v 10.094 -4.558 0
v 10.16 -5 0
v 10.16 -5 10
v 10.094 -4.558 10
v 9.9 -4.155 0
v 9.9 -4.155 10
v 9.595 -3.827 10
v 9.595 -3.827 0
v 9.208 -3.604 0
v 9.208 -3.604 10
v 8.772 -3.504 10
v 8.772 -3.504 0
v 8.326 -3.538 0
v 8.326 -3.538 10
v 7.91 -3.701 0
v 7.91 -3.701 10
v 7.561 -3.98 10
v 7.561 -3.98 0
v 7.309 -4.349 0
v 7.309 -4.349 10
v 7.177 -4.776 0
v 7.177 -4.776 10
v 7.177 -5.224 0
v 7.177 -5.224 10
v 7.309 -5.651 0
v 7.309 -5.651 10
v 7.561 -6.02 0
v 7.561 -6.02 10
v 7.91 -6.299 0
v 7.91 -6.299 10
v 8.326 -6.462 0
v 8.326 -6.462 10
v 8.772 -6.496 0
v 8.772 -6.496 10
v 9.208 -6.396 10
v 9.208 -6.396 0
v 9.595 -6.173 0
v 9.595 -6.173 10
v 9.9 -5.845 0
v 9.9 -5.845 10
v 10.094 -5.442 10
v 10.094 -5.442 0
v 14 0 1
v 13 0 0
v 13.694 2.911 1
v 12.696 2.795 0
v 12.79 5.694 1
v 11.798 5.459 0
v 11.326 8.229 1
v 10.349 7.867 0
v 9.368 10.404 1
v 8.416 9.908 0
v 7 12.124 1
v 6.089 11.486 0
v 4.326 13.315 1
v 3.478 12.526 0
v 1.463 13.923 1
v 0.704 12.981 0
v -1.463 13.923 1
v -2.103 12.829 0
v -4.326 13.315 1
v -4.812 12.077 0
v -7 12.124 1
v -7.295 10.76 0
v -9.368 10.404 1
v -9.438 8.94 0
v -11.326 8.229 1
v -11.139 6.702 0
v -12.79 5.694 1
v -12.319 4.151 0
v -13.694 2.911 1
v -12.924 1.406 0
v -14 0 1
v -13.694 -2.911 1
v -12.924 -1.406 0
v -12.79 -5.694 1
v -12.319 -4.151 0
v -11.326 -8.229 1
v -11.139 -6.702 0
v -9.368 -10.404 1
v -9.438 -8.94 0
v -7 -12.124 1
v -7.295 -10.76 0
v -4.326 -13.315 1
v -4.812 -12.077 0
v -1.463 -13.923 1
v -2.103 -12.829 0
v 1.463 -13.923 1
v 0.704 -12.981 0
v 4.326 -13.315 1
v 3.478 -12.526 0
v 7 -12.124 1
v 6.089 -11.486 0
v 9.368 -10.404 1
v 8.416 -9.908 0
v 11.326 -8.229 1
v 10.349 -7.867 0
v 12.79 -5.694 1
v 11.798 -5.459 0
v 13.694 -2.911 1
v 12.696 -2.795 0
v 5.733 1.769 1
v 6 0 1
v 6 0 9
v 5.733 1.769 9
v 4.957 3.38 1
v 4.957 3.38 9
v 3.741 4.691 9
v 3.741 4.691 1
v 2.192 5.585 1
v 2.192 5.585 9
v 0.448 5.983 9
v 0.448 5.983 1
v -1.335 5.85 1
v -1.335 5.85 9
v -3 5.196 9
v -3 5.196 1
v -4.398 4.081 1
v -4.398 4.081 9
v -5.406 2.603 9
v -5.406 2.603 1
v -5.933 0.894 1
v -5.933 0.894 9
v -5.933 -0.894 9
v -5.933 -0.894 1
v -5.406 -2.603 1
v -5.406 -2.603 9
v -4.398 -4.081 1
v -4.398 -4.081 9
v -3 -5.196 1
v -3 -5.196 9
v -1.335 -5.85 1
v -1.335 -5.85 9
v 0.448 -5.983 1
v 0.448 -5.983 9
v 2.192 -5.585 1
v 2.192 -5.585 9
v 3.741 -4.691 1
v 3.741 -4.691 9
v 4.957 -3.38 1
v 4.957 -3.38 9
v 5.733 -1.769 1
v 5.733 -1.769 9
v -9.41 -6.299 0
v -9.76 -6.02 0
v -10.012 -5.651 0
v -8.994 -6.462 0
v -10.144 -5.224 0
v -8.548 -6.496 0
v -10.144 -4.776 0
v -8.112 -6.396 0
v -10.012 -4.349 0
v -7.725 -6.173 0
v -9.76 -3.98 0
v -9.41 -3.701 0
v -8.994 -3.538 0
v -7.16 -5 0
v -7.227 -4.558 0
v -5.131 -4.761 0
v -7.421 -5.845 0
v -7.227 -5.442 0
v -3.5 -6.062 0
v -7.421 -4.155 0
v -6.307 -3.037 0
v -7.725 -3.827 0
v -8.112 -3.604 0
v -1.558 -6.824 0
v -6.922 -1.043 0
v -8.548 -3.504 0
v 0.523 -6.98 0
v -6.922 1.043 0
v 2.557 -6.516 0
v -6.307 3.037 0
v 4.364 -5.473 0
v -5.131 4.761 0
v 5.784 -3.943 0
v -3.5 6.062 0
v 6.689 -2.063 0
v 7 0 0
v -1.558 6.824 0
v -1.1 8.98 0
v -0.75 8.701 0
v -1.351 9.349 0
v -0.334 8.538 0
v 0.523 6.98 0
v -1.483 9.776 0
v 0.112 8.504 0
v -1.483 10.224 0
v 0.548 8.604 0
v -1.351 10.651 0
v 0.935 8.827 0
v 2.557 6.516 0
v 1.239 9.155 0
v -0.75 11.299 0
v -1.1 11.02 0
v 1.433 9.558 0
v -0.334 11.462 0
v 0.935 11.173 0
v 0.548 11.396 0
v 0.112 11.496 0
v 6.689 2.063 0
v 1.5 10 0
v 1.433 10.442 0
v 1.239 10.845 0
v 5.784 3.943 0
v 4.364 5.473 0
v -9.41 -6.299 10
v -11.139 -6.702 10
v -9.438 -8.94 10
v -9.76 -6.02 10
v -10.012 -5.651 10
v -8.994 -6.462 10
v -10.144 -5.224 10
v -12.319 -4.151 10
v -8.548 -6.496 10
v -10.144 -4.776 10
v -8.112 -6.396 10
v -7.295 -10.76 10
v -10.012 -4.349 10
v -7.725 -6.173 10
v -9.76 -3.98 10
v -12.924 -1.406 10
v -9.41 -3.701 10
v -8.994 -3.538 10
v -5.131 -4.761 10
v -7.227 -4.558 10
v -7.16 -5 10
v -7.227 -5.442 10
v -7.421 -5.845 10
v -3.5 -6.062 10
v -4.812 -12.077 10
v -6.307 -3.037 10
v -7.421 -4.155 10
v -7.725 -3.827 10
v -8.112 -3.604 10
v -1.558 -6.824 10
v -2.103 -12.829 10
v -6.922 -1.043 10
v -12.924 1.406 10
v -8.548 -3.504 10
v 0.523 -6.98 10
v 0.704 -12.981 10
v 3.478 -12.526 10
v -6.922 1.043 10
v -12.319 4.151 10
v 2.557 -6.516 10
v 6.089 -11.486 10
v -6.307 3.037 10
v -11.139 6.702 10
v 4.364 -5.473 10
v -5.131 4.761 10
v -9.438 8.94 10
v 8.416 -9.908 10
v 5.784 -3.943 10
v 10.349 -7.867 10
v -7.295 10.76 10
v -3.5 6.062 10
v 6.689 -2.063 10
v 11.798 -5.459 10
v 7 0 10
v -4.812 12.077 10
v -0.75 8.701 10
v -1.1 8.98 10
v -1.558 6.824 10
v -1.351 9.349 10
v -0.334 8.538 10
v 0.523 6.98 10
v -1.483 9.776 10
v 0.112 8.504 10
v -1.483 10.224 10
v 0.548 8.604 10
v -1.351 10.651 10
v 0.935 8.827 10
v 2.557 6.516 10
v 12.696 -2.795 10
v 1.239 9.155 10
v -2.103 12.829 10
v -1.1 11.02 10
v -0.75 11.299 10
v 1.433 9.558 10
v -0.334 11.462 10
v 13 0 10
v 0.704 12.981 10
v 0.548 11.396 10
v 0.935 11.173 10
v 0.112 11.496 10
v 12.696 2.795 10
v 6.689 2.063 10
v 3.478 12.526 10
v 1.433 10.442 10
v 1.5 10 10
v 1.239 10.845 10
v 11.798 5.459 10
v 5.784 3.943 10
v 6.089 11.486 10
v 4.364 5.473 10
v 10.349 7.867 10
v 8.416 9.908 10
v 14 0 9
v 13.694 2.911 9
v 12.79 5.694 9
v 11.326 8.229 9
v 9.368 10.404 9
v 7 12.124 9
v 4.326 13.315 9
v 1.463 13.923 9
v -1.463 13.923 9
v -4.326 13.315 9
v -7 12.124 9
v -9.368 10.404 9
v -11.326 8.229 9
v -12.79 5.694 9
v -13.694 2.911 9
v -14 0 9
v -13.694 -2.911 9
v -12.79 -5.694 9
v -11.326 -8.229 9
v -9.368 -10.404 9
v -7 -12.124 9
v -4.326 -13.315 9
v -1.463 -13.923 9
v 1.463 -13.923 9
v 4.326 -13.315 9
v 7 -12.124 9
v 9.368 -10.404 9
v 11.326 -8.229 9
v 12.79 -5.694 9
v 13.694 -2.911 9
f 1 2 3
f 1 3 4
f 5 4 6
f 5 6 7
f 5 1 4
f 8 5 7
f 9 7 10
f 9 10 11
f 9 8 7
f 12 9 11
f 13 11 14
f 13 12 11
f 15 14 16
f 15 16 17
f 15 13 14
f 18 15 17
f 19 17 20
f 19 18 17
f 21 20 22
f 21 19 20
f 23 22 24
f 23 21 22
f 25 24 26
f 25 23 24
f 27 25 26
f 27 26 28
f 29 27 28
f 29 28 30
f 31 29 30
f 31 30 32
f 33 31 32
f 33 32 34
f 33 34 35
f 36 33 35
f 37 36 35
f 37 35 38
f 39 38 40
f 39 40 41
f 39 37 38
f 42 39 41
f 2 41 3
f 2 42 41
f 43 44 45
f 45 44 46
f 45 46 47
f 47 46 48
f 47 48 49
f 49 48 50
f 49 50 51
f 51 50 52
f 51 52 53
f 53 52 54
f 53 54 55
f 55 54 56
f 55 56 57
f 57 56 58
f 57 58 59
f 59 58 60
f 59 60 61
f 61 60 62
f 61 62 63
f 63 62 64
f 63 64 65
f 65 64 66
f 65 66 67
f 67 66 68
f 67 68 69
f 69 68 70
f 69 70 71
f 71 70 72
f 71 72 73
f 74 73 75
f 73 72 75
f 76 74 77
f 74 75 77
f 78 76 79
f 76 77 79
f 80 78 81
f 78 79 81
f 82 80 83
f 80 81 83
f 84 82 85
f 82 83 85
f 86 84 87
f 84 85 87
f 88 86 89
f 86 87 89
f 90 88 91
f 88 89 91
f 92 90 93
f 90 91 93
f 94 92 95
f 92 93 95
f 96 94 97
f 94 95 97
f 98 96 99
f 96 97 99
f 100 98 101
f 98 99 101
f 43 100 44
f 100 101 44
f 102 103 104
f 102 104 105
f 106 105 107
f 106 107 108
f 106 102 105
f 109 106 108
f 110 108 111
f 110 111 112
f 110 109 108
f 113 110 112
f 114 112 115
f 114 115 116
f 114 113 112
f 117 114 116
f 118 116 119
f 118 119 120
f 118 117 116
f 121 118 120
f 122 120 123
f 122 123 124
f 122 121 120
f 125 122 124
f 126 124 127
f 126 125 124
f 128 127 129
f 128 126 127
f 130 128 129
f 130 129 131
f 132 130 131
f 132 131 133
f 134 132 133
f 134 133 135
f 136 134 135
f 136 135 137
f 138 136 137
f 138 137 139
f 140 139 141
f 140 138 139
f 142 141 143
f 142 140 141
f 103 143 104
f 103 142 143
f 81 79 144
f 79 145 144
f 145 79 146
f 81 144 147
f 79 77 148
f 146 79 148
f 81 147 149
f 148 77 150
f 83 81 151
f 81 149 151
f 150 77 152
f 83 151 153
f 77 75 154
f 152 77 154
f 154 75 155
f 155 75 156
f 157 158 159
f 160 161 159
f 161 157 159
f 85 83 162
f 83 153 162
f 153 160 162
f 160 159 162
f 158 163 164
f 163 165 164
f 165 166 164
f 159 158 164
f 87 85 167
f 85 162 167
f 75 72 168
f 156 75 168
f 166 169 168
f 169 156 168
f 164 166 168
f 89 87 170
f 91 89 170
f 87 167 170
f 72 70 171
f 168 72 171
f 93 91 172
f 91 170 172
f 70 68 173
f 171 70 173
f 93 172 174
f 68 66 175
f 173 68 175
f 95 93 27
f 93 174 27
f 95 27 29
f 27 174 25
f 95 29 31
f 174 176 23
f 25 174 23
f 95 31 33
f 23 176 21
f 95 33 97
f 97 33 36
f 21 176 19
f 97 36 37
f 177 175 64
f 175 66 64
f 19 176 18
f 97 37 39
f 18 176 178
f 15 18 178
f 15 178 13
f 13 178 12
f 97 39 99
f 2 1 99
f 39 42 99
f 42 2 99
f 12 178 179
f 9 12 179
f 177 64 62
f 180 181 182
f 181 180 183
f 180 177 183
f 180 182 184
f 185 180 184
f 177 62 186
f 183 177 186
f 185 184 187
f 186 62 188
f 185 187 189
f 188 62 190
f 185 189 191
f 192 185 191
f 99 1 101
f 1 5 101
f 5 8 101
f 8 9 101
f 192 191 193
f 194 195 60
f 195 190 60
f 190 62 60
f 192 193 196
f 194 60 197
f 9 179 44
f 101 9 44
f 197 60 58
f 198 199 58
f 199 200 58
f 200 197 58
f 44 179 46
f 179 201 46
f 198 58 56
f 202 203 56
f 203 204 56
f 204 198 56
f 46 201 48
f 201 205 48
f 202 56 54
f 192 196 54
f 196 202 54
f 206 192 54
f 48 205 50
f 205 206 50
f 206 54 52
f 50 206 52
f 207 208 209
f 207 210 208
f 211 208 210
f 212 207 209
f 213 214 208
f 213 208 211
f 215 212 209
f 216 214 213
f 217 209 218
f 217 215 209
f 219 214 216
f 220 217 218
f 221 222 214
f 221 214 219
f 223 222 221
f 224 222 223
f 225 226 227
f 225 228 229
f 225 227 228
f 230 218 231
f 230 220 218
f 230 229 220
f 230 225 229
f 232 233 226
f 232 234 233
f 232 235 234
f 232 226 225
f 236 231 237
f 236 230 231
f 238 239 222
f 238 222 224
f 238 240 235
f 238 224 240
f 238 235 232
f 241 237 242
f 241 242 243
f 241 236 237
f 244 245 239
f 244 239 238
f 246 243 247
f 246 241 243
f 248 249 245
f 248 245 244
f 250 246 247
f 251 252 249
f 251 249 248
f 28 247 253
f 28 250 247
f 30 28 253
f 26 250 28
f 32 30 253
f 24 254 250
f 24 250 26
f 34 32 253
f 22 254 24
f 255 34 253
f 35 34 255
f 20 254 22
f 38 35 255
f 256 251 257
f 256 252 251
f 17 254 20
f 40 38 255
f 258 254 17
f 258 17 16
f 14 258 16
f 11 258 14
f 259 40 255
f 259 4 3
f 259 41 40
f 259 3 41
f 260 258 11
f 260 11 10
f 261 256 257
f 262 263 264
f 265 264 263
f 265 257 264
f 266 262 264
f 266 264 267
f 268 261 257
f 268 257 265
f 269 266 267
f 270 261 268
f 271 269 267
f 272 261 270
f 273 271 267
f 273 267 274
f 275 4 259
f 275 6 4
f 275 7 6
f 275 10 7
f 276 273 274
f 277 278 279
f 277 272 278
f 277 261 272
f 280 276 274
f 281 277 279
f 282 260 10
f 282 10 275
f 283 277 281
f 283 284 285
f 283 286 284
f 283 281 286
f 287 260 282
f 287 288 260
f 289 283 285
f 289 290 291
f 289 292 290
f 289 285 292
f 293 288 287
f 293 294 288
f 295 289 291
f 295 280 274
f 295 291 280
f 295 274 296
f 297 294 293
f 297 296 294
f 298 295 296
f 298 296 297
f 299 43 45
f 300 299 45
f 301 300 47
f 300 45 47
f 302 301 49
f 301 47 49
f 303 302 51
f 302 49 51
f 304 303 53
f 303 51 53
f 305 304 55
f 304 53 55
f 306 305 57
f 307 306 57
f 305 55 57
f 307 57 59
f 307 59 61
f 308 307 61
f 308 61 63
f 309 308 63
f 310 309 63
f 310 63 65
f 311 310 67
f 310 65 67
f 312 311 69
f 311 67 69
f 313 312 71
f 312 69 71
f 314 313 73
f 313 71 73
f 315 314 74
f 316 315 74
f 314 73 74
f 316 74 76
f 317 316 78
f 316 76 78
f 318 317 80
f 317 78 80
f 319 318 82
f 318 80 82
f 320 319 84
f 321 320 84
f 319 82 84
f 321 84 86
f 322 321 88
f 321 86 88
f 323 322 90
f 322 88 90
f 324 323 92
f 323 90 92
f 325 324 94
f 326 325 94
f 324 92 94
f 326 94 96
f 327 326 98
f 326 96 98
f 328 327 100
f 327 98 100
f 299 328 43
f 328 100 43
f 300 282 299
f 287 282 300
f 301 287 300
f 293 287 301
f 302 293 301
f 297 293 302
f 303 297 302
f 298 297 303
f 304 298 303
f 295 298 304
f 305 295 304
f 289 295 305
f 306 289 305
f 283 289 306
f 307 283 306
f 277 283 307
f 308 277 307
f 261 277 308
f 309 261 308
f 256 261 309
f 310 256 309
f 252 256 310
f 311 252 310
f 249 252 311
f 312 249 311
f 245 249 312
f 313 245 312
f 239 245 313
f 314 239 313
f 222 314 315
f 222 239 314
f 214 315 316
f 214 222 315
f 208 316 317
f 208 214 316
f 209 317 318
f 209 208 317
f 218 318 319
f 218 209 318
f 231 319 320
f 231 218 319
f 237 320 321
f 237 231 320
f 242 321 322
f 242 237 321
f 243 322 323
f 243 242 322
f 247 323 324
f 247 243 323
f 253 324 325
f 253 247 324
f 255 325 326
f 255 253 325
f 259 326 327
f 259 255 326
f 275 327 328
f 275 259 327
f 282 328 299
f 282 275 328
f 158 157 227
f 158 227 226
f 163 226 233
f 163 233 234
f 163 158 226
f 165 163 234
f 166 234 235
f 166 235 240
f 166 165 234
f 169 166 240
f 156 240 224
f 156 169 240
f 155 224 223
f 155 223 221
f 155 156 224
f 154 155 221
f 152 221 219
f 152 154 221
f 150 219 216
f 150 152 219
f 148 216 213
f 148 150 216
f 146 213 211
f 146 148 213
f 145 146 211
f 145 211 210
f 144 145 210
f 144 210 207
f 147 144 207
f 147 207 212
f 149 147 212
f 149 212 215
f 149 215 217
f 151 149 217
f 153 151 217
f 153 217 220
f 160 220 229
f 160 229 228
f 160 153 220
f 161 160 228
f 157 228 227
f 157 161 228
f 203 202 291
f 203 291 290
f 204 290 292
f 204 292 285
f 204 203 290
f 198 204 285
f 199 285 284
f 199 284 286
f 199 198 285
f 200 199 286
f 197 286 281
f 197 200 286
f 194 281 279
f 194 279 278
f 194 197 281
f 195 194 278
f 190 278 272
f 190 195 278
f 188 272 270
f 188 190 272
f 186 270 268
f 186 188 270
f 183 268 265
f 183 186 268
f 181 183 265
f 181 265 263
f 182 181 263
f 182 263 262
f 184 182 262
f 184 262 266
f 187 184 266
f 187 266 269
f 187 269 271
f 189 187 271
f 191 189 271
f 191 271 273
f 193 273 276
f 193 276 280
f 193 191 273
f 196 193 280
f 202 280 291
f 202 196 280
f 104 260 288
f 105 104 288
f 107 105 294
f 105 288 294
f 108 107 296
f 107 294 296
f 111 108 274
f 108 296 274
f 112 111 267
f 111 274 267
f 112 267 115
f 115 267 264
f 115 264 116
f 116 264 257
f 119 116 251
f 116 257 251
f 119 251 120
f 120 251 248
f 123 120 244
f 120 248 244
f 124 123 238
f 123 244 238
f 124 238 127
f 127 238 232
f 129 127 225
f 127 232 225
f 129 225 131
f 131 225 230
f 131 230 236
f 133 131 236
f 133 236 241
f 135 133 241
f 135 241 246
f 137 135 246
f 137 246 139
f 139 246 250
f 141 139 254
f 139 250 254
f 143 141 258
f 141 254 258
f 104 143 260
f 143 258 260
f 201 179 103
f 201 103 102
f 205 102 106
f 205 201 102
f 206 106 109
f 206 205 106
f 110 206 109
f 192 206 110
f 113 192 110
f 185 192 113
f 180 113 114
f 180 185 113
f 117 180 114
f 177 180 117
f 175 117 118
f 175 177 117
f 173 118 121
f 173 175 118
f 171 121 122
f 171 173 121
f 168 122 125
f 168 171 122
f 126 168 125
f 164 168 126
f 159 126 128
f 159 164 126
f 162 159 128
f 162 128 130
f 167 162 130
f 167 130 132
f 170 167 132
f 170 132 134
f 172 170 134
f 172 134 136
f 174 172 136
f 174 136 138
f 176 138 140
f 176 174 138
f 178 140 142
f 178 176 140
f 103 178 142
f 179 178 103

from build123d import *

# Parameters (mm, degrees)
SKETCH1_R           = 14
SKETCH1_R_2         = 6
SKETCH1_R_3         = 1.5
BOSS_EXTRUDE1_DEPTH = 10
CHAMFER1_SIZE       = 1


with BuildPart() as part:
    # Sketch1 → Boss-Extrude1 (new body)
    with BuildSketch(Plane.XY):
        Circle(SKETCH1_R)
        Circle(SKETCH1_R_2, mode=Mode.SUBTRACT)
        with Locations((0, 10)):
            Circle(SKETCH1_R_3, mode=Mode.SUBTRACT)
        with Locations((8.660254038, -5)):
            Circle(SKETCH1_R_3, mode=Mode.SUBTRACT)
        with Locations((-8.660254038, -5)):
            Circle(SKETCH1_R_3, mode=Mode.SUBTRACT)
    extrude(amount=BOSS_EXTRUDE1_DEPTH)

    # Chamfer1
    chamfer1_edges = [part.edges().sort_by_distance(p)[0] for p in [
        (-14, 0, 0),
        (-14, 0, 10),
        (-6, 0, 0),
        (-6, 0, 10),
    ]]
    chamfer(chamfer1_edges, length=CHAMFER1_SIZE)


solid = part.part
